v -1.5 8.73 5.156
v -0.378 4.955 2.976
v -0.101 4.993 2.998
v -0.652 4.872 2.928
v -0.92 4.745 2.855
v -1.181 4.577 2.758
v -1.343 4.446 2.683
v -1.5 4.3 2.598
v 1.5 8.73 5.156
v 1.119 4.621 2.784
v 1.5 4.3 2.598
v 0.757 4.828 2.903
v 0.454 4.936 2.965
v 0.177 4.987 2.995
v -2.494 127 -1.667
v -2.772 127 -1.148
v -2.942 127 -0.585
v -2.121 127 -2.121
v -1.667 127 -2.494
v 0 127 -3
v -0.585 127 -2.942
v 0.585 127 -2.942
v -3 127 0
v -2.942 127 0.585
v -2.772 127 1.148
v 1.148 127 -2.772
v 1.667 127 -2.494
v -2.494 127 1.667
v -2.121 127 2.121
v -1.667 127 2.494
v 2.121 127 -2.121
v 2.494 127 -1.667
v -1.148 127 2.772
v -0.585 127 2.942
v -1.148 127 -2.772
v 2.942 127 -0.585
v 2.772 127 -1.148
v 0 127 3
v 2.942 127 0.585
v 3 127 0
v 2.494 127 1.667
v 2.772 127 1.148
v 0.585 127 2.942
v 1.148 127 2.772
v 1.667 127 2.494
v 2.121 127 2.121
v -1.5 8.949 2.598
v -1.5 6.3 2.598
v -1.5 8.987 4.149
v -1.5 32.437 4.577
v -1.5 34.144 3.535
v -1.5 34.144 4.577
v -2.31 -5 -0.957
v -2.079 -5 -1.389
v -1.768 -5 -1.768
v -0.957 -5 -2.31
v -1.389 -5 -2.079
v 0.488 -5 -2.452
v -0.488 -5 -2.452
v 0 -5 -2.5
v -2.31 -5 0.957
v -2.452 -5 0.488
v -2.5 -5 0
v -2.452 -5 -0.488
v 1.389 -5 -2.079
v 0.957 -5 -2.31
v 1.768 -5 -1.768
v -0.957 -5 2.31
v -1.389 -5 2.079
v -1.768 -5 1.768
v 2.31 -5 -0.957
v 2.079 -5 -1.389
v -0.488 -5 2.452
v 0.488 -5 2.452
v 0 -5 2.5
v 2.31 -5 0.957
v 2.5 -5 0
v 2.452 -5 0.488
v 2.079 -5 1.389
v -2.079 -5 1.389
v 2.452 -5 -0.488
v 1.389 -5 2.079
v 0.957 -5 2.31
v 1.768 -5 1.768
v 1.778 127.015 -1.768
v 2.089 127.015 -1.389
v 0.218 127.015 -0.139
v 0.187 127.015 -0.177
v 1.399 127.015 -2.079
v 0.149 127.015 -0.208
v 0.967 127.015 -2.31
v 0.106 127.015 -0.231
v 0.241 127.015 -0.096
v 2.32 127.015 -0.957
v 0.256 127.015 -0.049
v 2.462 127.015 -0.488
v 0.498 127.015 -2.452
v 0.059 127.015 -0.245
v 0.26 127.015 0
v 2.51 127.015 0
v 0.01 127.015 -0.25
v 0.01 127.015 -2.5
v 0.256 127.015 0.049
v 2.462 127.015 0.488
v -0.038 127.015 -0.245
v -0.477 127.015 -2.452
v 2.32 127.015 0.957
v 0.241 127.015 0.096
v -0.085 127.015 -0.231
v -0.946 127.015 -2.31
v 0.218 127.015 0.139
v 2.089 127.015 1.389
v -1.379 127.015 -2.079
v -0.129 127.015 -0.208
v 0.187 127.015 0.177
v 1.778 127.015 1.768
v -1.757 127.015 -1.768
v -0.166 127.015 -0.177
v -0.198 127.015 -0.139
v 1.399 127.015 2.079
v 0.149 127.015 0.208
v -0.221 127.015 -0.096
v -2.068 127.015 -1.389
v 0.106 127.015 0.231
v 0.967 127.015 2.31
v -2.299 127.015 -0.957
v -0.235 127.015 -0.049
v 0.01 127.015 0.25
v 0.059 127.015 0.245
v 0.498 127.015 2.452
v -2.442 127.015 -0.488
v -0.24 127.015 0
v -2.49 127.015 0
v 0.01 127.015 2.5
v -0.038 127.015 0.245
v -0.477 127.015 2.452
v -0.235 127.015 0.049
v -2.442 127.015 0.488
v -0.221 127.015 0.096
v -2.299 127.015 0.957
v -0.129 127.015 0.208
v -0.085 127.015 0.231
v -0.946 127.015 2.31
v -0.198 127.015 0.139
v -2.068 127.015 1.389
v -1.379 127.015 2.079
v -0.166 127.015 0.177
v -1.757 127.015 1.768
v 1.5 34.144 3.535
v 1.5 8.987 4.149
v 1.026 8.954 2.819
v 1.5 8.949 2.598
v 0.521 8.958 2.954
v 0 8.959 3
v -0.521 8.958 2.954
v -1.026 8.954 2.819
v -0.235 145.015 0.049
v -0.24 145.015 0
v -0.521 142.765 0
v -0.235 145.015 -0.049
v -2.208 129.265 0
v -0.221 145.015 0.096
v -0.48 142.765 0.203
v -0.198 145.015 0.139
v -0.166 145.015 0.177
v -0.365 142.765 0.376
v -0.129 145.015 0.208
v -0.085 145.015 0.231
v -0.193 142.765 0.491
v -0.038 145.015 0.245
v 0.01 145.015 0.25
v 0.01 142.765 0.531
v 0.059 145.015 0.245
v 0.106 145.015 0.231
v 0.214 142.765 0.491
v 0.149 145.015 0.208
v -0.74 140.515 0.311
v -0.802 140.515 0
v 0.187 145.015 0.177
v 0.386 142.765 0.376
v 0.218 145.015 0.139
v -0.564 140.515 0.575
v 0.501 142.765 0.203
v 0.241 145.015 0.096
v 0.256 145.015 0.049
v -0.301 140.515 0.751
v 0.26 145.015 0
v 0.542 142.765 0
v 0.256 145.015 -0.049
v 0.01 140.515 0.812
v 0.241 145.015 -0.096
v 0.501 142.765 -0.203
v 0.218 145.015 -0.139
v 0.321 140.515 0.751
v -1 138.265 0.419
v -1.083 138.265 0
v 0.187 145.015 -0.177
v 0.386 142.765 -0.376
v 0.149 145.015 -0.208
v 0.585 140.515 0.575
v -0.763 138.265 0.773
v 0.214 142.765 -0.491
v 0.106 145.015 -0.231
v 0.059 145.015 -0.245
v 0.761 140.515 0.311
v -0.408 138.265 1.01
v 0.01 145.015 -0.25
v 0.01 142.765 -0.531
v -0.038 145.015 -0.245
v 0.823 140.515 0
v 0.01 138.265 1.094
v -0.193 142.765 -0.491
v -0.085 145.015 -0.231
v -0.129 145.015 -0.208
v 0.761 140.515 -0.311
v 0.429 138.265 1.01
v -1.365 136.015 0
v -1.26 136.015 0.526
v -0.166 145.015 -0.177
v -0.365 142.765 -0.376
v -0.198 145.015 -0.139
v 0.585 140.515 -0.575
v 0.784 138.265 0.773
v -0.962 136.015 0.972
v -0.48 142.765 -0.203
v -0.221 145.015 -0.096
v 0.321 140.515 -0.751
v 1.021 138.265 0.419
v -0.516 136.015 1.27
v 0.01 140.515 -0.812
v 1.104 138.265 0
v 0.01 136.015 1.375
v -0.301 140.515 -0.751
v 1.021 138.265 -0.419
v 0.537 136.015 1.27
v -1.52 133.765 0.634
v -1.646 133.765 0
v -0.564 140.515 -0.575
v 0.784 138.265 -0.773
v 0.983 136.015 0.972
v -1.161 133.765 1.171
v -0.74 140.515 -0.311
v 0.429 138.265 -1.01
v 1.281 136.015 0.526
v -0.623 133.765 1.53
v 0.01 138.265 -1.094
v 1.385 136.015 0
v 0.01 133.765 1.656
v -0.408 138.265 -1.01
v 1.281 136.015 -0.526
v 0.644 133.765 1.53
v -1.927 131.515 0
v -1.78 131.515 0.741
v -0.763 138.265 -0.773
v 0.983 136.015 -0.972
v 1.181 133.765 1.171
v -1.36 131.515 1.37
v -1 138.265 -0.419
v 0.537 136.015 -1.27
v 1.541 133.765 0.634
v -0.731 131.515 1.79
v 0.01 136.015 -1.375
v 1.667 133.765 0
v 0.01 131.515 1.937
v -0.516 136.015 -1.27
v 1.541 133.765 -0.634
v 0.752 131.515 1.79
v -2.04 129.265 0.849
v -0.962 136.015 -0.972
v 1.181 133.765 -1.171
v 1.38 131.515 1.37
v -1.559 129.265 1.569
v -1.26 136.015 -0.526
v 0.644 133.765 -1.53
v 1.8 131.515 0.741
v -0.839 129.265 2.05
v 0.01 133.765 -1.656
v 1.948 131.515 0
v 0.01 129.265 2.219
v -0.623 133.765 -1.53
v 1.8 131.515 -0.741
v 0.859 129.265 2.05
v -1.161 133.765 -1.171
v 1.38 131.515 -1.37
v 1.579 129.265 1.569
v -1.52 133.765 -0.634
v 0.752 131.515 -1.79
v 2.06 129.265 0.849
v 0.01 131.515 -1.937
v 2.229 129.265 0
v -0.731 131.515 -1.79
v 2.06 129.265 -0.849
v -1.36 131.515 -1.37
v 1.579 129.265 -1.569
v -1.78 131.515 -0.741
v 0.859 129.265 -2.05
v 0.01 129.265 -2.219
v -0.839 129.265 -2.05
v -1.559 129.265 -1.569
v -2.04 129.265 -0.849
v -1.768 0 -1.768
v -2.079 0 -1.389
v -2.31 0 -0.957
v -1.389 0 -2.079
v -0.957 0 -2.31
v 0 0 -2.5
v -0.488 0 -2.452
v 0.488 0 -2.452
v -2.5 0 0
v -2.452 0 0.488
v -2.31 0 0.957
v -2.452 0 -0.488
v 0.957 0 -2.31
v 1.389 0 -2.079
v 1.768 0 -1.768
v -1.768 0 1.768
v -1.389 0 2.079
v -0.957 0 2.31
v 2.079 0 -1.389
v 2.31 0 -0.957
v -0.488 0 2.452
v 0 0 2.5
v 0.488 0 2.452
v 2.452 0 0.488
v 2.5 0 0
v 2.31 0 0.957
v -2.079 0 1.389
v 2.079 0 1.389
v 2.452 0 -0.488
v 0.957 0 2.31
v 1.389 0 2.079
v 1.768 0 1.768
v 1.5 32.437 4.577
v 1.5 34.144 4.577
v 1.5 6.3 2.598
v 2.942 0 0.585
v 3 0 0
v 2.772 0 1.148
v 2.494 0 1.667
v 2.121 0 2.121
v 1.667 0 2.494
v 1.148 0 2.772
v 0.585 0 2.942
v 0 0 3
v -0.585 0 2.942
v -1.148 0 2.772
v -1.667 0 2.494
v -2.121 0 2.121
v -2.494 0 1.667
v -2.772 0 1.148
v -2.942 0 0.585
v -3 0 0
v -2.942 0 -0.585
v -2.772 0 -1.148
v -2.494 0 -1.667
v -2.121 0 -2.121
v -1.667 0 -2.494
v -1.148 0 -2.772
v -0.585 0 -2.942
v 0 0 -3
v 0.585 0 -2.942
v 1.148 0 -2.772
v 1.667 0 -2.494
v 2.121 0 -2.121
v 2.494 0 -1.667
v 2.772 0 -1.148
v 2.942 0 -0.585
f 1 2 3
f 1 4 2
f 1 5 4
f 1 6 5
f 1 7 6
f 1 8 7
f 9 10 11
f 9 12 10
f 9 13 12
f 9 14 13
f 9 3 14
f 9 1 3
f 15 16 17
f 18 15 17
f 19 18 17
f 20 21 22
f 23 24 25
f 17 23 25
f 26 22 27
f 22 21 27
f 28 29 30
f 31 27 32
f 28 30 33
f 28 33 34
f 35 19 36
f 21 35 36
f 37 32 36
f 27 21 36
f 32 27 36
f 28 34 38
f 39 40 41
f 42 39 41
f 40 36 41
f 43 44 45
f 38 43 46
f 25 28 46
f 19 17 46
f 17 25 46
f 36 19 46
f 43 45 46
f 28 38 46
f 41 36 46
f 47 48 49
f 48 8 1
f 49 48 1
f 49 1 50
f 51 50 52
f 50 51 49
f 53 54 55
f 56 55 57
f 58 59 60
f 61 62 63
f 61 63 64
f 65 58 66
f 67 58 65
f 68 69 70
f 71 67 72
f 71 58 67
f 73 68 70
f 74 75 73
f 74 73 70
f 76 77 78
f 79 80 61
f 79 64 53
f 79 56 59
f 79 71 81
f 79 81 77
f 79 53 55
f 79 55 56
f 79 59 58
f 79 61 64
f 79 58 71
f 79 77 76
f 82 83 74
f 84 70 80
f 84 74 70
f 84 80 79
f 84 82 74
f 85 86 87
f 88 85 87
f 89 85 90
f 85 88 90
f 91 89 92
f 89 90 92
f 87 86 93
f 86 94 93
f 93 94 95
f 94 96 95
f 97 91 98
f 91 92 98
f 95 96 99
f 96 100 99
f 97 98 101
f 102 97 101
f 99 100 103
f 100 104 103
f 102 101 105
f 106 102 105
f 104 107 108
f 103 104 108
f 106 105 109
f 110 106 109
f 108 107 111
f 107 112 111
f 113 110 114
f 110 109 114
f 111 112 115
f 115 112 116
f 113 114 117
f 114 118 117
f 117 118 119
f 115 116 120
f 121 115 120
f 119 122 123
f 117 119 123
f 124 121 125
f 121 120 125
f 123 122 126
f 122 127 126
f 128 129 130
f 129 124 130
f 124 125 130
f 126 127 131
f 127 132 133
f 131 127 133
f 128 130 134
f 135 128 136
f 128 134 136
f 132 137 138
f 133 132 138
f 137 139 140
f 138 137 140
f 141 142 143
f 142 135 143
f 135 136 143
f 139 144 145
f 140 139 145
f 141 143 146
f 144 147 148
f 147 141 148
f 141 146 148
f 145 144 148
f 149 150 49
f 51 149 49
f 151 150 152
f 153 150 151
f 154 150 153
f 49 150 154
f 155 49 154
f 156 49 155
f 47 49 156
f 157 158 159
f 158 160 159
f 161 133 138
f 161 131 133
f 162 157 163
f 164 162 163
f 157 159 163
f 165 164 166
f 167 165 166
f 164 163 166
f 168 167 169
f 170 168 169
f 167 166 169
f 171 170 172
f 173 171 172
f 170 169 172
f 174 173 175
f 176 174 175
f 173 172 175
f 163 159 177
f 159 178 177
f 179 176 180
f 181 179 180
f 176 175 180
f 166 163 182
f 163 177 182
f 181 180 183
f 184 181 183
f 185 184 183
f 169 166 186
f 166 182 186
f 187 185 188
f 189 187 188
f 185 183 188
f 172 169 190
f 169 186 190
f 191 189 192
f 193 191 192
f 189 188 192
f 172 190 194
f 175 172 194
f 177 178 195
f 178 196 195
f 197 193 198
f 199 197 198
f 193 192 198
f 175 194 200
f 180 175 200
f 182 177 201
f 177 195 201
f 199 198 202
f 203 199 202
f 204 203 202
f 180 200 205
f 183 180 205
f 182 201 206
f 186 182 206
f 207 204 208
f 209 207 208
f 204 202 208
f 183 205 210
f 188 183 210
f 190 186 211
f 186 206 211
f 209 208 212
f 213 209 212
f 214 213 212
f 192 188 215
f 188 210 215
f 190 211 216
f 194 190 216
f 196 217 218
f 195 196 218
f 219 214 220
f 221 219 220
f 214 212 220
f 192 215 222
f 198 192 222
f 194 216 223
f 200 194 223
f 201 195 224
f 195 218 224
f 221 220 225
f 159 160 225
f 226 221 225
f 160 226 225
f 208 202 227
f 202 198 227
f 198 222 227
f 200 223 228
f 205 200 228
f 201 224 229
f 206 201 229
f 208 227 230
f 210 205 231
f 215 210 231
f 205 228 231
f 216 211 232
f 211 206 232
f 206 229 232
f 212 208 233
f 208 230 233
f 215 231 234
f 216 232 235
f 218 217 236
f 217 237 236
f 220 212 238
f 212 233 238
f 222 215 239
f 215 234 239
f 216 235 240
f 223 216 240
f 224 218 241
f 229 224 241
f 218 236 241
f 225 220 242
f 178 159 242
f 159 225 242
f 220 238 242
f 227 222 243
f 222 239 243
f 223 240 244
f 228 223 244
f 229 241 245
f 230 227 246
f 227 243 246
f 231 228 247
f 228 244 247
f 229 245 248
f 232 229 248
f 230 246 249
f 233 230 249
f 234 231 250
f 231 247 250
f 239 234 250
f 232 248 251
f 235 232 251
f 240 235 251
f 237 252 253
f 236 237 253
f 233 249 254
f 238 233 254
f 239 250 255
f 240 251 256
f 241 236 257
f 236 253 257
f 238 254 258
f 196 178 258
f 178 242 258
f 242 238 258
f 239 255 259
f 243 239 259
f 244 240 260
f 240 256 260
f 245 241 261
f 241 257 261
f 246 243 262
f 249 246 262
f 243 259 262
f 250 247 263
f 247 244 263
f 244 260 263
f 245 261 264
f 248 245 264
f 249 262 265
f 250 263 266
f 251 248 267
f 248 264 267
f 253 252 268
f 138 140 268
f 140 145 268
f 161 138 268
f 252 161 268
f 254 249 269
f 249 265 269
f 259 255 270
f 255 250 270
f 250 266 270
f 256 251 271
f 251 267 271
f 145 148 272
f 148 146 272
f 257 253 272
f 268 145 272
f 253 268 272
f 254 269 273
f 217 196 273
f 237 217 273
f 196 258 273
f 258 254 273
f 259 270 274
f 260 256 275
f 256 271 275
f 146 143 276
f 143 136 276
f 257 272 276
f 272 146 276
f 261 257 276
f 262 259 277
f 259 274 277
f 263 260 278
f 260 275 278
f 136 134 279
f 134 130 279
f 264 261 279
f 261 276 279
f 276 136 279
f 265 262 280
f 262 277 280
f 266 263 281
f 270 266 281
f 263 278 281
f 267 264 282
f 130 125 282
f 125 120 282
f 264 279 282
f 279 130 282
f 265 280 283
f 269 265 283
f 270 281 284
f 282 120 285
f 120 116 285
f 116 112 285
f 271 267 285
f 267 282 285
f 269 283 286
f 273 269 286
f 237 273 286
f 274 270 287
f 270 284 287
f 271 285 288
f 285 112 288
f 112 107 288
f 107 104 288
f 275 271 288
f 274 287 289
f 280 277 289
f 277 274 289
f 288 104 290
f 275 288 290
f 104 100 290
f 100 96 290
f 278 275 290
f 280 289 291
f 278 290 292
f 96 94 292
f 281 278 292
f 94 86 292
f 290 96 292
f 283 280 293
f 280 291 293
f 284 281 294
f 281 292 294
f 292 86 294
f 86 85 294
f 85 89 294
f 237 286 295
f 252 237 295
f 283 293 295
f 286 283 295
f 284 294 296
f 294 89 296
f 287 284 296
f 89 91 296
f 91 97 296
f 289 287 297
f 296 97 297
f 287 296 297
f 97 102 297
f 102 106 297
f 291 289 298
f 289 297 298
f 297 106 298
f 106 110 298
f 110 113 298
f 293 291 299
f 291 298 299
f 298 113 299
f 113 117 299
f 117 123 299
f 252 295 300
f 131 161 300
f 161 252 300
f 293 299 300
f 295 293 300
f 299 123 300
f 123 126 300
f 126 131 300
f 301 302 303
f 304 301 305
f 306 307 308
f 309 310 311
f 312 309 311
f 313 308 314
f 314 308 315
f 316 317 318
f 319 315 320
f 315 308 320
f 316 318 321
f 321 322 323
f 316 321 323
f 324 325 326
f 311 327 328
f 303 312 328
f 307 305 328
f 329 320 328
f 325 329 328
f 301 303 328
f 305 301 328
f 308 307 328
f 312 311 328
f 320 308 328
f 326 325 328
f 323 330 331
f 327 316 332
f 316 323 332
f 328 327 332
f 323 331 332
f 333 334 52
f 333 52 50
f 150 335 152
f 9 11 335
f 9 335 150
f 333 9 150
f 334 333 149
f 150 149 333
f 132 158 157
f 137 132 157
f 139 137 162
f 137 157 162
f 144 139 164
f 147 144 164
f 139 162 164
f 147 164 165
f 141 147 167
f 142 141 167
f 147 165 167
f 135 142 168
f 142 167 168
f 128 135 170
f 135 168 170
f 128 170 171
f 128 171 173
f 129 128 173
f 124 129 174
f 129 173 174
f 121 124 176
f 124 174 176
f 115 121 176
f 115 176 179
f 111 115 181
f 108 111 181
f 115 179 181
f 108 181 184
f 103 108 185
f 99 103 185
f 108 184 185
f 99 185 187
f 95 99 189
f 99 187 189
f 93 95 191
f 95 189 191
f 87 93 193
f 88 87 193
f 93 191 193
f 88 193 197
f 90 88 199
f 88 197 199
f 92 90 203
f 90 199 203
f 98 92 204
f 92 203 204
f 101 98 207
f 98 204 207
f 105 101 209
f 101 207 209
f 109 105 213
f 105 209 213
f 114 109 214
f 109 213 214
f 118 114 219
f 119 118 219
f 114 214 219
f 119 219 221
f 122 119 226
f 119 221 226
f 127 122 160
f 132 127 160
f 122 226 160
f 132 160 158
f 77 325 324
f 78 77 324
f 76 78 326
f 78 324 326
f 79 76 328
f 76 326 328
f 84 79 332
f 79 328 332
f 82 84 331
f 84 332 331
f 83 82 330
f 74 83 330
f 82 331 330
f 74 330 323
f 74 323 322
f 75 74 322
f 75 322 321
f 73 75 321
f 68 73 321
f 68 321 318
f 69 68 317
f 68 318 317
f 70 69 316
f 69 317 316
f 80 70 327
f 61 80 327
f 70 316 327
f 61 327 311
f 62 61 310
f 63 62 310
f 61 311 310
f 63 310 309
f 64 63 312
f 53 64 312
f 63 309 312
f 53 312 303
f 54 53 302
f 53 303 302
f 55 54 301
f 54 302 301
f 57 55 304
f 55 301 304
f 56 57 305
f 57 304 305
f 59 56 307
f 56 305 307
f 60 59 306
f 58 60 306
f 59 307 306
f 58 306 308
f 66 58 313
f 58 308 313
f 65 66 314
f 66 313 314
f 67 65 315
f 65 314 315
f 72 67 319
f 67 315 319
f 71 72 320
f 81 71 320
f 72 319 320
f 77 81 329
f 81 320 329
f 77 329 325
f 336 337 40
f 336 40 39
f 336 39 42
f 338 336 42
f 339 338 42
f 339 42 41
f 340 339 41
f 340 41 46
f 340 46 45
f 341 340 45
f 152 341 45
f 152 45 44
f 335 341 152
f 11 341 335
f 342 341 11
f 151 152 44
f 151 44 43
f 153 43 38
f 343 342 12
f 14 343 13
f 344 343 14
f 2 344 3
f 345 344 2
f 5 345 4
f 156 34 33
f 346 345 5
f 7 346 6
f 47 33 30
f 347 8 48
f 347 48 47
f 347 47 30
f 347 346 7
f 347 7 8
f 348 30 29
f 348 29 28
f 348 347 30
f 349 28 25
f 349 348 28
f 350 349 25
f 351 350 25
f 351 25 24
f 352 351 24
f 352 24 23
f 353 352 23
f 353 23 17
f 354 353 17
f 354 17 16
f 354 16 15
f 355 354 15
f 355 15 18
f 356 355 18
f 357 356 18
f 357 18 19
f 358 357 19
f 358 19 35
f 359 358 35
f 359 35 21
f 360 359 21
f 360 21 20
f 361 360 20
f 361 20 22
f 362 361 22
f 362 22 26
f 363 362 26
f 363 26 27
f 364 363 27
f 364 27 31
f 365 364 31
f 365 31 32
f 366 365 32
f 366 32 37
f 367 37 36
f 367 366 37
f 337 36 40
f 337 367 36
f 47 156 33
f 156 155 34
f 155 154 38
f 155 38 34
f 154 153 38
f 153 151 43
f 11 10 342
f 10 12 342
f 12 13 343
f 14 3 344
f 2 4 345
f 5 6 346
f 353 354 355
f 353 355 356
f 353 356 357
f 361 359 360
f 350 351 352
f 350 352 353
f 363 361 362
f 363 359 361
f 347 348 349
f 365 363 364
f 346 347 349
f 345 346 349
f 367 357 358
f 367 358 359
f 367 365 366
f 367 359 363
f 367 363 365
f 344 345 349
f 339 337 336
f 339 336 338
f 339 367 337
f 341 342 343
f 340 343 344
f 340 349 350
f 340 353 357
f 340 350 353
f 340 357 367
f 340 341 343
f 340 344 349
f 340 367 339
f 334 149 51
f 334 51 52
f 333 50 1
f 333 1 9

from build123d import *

# Parameters (mm, degrees)
F0_R      = 3
F1_DEPTH  = 127
F5_DEPTH  = 18
F2_R      = 2.5
F9_DEPTH  = 5
F12_DEPTH = 3
F14_DEPTH = 3


with BuildPart() as f1:
    # F0 (on Front) → F1 (new body)
    with BuildSketch(Plane.XZ):
        Circle(F0_R)
    extrude(amount=-F1_DEPTH)

    # F10: sweep along a path in F6
    with BuildLine(Plane.YZ) as f10_path:
        Line((5.9960522478, 2.5535523714), (8.9578591287, 4.2635523714))
        Line((8.9578591287, 4.2635523714), (33.9504102688, 3.6533167544))
    # F8 (on offset) → F10 (sweep)
    with BuildSketch(Plane.XY.offset(3)):
        Polygon((1.5, 6.9960522478), (0, 6.9960522478), (-1.5, 6.9960522478), (-1.5, 4.9960522478), (1.5, 4.9960522478), align=None)
    sweep(path=f10_path.line, transition=Transition.RIGHT)

    # F11 (on face) → F12 (join)
    with BuildSketch(Plane(origin=(-1.5, 0, 0), x_dir=(0, -1, 0), z_dir=(-1, 0, 0))):
        Polygon((-6.2998998251, 2.5980762114), (-8.9869465357, 4.1494433531), (-8.94906727, 2.5980762114), align=None)
    extrude(amount=-F12_DEPTH)

    # F13 (on face) → F14 (join)
    with BuildSketch(Plane.YZ.offset(1.5)):
        Polygon((34.1439385505, 4.577173042), (32.4368132398, 4.577173042), (34.1439385505, 3.5351926326), align=None)
    extrude(amount=-F14_DEPTH)


with BuildPart() as f4:
    # F3 (on Top) → F4 (revolve)
    with BuildSketch(Plane.XY):
        Polygon((-2.489665756, 127.0154416561), (0.010334244, 127.0154416561), (0.010334244, 145.0154416561), (-0.239665756, 145.0154416561), align=None)
    revolve(axis=Axis((0.010334244, 136.0154416561, 0), (0, 1, 0)))

    # F5 (cut): a face of the model
    f5_faces = [f4.faces().sort_by_distance(p)[0] for p in [
        (0.010334244, 145.0154416561, 0),
    ]]
    extrude(f5_faces, amount=-F5_DEPTH, mode=Mode.SUBTRACT)


with BuildPart() as f9:
    # F2 (on face) → F9 (new body)
    with BuildSketch(Plane.XZ):
        Circle(F2_R)
    extrude(amount=F9_DEPTH)


solid = Compound([f1.part, f4.part, f9.part])
